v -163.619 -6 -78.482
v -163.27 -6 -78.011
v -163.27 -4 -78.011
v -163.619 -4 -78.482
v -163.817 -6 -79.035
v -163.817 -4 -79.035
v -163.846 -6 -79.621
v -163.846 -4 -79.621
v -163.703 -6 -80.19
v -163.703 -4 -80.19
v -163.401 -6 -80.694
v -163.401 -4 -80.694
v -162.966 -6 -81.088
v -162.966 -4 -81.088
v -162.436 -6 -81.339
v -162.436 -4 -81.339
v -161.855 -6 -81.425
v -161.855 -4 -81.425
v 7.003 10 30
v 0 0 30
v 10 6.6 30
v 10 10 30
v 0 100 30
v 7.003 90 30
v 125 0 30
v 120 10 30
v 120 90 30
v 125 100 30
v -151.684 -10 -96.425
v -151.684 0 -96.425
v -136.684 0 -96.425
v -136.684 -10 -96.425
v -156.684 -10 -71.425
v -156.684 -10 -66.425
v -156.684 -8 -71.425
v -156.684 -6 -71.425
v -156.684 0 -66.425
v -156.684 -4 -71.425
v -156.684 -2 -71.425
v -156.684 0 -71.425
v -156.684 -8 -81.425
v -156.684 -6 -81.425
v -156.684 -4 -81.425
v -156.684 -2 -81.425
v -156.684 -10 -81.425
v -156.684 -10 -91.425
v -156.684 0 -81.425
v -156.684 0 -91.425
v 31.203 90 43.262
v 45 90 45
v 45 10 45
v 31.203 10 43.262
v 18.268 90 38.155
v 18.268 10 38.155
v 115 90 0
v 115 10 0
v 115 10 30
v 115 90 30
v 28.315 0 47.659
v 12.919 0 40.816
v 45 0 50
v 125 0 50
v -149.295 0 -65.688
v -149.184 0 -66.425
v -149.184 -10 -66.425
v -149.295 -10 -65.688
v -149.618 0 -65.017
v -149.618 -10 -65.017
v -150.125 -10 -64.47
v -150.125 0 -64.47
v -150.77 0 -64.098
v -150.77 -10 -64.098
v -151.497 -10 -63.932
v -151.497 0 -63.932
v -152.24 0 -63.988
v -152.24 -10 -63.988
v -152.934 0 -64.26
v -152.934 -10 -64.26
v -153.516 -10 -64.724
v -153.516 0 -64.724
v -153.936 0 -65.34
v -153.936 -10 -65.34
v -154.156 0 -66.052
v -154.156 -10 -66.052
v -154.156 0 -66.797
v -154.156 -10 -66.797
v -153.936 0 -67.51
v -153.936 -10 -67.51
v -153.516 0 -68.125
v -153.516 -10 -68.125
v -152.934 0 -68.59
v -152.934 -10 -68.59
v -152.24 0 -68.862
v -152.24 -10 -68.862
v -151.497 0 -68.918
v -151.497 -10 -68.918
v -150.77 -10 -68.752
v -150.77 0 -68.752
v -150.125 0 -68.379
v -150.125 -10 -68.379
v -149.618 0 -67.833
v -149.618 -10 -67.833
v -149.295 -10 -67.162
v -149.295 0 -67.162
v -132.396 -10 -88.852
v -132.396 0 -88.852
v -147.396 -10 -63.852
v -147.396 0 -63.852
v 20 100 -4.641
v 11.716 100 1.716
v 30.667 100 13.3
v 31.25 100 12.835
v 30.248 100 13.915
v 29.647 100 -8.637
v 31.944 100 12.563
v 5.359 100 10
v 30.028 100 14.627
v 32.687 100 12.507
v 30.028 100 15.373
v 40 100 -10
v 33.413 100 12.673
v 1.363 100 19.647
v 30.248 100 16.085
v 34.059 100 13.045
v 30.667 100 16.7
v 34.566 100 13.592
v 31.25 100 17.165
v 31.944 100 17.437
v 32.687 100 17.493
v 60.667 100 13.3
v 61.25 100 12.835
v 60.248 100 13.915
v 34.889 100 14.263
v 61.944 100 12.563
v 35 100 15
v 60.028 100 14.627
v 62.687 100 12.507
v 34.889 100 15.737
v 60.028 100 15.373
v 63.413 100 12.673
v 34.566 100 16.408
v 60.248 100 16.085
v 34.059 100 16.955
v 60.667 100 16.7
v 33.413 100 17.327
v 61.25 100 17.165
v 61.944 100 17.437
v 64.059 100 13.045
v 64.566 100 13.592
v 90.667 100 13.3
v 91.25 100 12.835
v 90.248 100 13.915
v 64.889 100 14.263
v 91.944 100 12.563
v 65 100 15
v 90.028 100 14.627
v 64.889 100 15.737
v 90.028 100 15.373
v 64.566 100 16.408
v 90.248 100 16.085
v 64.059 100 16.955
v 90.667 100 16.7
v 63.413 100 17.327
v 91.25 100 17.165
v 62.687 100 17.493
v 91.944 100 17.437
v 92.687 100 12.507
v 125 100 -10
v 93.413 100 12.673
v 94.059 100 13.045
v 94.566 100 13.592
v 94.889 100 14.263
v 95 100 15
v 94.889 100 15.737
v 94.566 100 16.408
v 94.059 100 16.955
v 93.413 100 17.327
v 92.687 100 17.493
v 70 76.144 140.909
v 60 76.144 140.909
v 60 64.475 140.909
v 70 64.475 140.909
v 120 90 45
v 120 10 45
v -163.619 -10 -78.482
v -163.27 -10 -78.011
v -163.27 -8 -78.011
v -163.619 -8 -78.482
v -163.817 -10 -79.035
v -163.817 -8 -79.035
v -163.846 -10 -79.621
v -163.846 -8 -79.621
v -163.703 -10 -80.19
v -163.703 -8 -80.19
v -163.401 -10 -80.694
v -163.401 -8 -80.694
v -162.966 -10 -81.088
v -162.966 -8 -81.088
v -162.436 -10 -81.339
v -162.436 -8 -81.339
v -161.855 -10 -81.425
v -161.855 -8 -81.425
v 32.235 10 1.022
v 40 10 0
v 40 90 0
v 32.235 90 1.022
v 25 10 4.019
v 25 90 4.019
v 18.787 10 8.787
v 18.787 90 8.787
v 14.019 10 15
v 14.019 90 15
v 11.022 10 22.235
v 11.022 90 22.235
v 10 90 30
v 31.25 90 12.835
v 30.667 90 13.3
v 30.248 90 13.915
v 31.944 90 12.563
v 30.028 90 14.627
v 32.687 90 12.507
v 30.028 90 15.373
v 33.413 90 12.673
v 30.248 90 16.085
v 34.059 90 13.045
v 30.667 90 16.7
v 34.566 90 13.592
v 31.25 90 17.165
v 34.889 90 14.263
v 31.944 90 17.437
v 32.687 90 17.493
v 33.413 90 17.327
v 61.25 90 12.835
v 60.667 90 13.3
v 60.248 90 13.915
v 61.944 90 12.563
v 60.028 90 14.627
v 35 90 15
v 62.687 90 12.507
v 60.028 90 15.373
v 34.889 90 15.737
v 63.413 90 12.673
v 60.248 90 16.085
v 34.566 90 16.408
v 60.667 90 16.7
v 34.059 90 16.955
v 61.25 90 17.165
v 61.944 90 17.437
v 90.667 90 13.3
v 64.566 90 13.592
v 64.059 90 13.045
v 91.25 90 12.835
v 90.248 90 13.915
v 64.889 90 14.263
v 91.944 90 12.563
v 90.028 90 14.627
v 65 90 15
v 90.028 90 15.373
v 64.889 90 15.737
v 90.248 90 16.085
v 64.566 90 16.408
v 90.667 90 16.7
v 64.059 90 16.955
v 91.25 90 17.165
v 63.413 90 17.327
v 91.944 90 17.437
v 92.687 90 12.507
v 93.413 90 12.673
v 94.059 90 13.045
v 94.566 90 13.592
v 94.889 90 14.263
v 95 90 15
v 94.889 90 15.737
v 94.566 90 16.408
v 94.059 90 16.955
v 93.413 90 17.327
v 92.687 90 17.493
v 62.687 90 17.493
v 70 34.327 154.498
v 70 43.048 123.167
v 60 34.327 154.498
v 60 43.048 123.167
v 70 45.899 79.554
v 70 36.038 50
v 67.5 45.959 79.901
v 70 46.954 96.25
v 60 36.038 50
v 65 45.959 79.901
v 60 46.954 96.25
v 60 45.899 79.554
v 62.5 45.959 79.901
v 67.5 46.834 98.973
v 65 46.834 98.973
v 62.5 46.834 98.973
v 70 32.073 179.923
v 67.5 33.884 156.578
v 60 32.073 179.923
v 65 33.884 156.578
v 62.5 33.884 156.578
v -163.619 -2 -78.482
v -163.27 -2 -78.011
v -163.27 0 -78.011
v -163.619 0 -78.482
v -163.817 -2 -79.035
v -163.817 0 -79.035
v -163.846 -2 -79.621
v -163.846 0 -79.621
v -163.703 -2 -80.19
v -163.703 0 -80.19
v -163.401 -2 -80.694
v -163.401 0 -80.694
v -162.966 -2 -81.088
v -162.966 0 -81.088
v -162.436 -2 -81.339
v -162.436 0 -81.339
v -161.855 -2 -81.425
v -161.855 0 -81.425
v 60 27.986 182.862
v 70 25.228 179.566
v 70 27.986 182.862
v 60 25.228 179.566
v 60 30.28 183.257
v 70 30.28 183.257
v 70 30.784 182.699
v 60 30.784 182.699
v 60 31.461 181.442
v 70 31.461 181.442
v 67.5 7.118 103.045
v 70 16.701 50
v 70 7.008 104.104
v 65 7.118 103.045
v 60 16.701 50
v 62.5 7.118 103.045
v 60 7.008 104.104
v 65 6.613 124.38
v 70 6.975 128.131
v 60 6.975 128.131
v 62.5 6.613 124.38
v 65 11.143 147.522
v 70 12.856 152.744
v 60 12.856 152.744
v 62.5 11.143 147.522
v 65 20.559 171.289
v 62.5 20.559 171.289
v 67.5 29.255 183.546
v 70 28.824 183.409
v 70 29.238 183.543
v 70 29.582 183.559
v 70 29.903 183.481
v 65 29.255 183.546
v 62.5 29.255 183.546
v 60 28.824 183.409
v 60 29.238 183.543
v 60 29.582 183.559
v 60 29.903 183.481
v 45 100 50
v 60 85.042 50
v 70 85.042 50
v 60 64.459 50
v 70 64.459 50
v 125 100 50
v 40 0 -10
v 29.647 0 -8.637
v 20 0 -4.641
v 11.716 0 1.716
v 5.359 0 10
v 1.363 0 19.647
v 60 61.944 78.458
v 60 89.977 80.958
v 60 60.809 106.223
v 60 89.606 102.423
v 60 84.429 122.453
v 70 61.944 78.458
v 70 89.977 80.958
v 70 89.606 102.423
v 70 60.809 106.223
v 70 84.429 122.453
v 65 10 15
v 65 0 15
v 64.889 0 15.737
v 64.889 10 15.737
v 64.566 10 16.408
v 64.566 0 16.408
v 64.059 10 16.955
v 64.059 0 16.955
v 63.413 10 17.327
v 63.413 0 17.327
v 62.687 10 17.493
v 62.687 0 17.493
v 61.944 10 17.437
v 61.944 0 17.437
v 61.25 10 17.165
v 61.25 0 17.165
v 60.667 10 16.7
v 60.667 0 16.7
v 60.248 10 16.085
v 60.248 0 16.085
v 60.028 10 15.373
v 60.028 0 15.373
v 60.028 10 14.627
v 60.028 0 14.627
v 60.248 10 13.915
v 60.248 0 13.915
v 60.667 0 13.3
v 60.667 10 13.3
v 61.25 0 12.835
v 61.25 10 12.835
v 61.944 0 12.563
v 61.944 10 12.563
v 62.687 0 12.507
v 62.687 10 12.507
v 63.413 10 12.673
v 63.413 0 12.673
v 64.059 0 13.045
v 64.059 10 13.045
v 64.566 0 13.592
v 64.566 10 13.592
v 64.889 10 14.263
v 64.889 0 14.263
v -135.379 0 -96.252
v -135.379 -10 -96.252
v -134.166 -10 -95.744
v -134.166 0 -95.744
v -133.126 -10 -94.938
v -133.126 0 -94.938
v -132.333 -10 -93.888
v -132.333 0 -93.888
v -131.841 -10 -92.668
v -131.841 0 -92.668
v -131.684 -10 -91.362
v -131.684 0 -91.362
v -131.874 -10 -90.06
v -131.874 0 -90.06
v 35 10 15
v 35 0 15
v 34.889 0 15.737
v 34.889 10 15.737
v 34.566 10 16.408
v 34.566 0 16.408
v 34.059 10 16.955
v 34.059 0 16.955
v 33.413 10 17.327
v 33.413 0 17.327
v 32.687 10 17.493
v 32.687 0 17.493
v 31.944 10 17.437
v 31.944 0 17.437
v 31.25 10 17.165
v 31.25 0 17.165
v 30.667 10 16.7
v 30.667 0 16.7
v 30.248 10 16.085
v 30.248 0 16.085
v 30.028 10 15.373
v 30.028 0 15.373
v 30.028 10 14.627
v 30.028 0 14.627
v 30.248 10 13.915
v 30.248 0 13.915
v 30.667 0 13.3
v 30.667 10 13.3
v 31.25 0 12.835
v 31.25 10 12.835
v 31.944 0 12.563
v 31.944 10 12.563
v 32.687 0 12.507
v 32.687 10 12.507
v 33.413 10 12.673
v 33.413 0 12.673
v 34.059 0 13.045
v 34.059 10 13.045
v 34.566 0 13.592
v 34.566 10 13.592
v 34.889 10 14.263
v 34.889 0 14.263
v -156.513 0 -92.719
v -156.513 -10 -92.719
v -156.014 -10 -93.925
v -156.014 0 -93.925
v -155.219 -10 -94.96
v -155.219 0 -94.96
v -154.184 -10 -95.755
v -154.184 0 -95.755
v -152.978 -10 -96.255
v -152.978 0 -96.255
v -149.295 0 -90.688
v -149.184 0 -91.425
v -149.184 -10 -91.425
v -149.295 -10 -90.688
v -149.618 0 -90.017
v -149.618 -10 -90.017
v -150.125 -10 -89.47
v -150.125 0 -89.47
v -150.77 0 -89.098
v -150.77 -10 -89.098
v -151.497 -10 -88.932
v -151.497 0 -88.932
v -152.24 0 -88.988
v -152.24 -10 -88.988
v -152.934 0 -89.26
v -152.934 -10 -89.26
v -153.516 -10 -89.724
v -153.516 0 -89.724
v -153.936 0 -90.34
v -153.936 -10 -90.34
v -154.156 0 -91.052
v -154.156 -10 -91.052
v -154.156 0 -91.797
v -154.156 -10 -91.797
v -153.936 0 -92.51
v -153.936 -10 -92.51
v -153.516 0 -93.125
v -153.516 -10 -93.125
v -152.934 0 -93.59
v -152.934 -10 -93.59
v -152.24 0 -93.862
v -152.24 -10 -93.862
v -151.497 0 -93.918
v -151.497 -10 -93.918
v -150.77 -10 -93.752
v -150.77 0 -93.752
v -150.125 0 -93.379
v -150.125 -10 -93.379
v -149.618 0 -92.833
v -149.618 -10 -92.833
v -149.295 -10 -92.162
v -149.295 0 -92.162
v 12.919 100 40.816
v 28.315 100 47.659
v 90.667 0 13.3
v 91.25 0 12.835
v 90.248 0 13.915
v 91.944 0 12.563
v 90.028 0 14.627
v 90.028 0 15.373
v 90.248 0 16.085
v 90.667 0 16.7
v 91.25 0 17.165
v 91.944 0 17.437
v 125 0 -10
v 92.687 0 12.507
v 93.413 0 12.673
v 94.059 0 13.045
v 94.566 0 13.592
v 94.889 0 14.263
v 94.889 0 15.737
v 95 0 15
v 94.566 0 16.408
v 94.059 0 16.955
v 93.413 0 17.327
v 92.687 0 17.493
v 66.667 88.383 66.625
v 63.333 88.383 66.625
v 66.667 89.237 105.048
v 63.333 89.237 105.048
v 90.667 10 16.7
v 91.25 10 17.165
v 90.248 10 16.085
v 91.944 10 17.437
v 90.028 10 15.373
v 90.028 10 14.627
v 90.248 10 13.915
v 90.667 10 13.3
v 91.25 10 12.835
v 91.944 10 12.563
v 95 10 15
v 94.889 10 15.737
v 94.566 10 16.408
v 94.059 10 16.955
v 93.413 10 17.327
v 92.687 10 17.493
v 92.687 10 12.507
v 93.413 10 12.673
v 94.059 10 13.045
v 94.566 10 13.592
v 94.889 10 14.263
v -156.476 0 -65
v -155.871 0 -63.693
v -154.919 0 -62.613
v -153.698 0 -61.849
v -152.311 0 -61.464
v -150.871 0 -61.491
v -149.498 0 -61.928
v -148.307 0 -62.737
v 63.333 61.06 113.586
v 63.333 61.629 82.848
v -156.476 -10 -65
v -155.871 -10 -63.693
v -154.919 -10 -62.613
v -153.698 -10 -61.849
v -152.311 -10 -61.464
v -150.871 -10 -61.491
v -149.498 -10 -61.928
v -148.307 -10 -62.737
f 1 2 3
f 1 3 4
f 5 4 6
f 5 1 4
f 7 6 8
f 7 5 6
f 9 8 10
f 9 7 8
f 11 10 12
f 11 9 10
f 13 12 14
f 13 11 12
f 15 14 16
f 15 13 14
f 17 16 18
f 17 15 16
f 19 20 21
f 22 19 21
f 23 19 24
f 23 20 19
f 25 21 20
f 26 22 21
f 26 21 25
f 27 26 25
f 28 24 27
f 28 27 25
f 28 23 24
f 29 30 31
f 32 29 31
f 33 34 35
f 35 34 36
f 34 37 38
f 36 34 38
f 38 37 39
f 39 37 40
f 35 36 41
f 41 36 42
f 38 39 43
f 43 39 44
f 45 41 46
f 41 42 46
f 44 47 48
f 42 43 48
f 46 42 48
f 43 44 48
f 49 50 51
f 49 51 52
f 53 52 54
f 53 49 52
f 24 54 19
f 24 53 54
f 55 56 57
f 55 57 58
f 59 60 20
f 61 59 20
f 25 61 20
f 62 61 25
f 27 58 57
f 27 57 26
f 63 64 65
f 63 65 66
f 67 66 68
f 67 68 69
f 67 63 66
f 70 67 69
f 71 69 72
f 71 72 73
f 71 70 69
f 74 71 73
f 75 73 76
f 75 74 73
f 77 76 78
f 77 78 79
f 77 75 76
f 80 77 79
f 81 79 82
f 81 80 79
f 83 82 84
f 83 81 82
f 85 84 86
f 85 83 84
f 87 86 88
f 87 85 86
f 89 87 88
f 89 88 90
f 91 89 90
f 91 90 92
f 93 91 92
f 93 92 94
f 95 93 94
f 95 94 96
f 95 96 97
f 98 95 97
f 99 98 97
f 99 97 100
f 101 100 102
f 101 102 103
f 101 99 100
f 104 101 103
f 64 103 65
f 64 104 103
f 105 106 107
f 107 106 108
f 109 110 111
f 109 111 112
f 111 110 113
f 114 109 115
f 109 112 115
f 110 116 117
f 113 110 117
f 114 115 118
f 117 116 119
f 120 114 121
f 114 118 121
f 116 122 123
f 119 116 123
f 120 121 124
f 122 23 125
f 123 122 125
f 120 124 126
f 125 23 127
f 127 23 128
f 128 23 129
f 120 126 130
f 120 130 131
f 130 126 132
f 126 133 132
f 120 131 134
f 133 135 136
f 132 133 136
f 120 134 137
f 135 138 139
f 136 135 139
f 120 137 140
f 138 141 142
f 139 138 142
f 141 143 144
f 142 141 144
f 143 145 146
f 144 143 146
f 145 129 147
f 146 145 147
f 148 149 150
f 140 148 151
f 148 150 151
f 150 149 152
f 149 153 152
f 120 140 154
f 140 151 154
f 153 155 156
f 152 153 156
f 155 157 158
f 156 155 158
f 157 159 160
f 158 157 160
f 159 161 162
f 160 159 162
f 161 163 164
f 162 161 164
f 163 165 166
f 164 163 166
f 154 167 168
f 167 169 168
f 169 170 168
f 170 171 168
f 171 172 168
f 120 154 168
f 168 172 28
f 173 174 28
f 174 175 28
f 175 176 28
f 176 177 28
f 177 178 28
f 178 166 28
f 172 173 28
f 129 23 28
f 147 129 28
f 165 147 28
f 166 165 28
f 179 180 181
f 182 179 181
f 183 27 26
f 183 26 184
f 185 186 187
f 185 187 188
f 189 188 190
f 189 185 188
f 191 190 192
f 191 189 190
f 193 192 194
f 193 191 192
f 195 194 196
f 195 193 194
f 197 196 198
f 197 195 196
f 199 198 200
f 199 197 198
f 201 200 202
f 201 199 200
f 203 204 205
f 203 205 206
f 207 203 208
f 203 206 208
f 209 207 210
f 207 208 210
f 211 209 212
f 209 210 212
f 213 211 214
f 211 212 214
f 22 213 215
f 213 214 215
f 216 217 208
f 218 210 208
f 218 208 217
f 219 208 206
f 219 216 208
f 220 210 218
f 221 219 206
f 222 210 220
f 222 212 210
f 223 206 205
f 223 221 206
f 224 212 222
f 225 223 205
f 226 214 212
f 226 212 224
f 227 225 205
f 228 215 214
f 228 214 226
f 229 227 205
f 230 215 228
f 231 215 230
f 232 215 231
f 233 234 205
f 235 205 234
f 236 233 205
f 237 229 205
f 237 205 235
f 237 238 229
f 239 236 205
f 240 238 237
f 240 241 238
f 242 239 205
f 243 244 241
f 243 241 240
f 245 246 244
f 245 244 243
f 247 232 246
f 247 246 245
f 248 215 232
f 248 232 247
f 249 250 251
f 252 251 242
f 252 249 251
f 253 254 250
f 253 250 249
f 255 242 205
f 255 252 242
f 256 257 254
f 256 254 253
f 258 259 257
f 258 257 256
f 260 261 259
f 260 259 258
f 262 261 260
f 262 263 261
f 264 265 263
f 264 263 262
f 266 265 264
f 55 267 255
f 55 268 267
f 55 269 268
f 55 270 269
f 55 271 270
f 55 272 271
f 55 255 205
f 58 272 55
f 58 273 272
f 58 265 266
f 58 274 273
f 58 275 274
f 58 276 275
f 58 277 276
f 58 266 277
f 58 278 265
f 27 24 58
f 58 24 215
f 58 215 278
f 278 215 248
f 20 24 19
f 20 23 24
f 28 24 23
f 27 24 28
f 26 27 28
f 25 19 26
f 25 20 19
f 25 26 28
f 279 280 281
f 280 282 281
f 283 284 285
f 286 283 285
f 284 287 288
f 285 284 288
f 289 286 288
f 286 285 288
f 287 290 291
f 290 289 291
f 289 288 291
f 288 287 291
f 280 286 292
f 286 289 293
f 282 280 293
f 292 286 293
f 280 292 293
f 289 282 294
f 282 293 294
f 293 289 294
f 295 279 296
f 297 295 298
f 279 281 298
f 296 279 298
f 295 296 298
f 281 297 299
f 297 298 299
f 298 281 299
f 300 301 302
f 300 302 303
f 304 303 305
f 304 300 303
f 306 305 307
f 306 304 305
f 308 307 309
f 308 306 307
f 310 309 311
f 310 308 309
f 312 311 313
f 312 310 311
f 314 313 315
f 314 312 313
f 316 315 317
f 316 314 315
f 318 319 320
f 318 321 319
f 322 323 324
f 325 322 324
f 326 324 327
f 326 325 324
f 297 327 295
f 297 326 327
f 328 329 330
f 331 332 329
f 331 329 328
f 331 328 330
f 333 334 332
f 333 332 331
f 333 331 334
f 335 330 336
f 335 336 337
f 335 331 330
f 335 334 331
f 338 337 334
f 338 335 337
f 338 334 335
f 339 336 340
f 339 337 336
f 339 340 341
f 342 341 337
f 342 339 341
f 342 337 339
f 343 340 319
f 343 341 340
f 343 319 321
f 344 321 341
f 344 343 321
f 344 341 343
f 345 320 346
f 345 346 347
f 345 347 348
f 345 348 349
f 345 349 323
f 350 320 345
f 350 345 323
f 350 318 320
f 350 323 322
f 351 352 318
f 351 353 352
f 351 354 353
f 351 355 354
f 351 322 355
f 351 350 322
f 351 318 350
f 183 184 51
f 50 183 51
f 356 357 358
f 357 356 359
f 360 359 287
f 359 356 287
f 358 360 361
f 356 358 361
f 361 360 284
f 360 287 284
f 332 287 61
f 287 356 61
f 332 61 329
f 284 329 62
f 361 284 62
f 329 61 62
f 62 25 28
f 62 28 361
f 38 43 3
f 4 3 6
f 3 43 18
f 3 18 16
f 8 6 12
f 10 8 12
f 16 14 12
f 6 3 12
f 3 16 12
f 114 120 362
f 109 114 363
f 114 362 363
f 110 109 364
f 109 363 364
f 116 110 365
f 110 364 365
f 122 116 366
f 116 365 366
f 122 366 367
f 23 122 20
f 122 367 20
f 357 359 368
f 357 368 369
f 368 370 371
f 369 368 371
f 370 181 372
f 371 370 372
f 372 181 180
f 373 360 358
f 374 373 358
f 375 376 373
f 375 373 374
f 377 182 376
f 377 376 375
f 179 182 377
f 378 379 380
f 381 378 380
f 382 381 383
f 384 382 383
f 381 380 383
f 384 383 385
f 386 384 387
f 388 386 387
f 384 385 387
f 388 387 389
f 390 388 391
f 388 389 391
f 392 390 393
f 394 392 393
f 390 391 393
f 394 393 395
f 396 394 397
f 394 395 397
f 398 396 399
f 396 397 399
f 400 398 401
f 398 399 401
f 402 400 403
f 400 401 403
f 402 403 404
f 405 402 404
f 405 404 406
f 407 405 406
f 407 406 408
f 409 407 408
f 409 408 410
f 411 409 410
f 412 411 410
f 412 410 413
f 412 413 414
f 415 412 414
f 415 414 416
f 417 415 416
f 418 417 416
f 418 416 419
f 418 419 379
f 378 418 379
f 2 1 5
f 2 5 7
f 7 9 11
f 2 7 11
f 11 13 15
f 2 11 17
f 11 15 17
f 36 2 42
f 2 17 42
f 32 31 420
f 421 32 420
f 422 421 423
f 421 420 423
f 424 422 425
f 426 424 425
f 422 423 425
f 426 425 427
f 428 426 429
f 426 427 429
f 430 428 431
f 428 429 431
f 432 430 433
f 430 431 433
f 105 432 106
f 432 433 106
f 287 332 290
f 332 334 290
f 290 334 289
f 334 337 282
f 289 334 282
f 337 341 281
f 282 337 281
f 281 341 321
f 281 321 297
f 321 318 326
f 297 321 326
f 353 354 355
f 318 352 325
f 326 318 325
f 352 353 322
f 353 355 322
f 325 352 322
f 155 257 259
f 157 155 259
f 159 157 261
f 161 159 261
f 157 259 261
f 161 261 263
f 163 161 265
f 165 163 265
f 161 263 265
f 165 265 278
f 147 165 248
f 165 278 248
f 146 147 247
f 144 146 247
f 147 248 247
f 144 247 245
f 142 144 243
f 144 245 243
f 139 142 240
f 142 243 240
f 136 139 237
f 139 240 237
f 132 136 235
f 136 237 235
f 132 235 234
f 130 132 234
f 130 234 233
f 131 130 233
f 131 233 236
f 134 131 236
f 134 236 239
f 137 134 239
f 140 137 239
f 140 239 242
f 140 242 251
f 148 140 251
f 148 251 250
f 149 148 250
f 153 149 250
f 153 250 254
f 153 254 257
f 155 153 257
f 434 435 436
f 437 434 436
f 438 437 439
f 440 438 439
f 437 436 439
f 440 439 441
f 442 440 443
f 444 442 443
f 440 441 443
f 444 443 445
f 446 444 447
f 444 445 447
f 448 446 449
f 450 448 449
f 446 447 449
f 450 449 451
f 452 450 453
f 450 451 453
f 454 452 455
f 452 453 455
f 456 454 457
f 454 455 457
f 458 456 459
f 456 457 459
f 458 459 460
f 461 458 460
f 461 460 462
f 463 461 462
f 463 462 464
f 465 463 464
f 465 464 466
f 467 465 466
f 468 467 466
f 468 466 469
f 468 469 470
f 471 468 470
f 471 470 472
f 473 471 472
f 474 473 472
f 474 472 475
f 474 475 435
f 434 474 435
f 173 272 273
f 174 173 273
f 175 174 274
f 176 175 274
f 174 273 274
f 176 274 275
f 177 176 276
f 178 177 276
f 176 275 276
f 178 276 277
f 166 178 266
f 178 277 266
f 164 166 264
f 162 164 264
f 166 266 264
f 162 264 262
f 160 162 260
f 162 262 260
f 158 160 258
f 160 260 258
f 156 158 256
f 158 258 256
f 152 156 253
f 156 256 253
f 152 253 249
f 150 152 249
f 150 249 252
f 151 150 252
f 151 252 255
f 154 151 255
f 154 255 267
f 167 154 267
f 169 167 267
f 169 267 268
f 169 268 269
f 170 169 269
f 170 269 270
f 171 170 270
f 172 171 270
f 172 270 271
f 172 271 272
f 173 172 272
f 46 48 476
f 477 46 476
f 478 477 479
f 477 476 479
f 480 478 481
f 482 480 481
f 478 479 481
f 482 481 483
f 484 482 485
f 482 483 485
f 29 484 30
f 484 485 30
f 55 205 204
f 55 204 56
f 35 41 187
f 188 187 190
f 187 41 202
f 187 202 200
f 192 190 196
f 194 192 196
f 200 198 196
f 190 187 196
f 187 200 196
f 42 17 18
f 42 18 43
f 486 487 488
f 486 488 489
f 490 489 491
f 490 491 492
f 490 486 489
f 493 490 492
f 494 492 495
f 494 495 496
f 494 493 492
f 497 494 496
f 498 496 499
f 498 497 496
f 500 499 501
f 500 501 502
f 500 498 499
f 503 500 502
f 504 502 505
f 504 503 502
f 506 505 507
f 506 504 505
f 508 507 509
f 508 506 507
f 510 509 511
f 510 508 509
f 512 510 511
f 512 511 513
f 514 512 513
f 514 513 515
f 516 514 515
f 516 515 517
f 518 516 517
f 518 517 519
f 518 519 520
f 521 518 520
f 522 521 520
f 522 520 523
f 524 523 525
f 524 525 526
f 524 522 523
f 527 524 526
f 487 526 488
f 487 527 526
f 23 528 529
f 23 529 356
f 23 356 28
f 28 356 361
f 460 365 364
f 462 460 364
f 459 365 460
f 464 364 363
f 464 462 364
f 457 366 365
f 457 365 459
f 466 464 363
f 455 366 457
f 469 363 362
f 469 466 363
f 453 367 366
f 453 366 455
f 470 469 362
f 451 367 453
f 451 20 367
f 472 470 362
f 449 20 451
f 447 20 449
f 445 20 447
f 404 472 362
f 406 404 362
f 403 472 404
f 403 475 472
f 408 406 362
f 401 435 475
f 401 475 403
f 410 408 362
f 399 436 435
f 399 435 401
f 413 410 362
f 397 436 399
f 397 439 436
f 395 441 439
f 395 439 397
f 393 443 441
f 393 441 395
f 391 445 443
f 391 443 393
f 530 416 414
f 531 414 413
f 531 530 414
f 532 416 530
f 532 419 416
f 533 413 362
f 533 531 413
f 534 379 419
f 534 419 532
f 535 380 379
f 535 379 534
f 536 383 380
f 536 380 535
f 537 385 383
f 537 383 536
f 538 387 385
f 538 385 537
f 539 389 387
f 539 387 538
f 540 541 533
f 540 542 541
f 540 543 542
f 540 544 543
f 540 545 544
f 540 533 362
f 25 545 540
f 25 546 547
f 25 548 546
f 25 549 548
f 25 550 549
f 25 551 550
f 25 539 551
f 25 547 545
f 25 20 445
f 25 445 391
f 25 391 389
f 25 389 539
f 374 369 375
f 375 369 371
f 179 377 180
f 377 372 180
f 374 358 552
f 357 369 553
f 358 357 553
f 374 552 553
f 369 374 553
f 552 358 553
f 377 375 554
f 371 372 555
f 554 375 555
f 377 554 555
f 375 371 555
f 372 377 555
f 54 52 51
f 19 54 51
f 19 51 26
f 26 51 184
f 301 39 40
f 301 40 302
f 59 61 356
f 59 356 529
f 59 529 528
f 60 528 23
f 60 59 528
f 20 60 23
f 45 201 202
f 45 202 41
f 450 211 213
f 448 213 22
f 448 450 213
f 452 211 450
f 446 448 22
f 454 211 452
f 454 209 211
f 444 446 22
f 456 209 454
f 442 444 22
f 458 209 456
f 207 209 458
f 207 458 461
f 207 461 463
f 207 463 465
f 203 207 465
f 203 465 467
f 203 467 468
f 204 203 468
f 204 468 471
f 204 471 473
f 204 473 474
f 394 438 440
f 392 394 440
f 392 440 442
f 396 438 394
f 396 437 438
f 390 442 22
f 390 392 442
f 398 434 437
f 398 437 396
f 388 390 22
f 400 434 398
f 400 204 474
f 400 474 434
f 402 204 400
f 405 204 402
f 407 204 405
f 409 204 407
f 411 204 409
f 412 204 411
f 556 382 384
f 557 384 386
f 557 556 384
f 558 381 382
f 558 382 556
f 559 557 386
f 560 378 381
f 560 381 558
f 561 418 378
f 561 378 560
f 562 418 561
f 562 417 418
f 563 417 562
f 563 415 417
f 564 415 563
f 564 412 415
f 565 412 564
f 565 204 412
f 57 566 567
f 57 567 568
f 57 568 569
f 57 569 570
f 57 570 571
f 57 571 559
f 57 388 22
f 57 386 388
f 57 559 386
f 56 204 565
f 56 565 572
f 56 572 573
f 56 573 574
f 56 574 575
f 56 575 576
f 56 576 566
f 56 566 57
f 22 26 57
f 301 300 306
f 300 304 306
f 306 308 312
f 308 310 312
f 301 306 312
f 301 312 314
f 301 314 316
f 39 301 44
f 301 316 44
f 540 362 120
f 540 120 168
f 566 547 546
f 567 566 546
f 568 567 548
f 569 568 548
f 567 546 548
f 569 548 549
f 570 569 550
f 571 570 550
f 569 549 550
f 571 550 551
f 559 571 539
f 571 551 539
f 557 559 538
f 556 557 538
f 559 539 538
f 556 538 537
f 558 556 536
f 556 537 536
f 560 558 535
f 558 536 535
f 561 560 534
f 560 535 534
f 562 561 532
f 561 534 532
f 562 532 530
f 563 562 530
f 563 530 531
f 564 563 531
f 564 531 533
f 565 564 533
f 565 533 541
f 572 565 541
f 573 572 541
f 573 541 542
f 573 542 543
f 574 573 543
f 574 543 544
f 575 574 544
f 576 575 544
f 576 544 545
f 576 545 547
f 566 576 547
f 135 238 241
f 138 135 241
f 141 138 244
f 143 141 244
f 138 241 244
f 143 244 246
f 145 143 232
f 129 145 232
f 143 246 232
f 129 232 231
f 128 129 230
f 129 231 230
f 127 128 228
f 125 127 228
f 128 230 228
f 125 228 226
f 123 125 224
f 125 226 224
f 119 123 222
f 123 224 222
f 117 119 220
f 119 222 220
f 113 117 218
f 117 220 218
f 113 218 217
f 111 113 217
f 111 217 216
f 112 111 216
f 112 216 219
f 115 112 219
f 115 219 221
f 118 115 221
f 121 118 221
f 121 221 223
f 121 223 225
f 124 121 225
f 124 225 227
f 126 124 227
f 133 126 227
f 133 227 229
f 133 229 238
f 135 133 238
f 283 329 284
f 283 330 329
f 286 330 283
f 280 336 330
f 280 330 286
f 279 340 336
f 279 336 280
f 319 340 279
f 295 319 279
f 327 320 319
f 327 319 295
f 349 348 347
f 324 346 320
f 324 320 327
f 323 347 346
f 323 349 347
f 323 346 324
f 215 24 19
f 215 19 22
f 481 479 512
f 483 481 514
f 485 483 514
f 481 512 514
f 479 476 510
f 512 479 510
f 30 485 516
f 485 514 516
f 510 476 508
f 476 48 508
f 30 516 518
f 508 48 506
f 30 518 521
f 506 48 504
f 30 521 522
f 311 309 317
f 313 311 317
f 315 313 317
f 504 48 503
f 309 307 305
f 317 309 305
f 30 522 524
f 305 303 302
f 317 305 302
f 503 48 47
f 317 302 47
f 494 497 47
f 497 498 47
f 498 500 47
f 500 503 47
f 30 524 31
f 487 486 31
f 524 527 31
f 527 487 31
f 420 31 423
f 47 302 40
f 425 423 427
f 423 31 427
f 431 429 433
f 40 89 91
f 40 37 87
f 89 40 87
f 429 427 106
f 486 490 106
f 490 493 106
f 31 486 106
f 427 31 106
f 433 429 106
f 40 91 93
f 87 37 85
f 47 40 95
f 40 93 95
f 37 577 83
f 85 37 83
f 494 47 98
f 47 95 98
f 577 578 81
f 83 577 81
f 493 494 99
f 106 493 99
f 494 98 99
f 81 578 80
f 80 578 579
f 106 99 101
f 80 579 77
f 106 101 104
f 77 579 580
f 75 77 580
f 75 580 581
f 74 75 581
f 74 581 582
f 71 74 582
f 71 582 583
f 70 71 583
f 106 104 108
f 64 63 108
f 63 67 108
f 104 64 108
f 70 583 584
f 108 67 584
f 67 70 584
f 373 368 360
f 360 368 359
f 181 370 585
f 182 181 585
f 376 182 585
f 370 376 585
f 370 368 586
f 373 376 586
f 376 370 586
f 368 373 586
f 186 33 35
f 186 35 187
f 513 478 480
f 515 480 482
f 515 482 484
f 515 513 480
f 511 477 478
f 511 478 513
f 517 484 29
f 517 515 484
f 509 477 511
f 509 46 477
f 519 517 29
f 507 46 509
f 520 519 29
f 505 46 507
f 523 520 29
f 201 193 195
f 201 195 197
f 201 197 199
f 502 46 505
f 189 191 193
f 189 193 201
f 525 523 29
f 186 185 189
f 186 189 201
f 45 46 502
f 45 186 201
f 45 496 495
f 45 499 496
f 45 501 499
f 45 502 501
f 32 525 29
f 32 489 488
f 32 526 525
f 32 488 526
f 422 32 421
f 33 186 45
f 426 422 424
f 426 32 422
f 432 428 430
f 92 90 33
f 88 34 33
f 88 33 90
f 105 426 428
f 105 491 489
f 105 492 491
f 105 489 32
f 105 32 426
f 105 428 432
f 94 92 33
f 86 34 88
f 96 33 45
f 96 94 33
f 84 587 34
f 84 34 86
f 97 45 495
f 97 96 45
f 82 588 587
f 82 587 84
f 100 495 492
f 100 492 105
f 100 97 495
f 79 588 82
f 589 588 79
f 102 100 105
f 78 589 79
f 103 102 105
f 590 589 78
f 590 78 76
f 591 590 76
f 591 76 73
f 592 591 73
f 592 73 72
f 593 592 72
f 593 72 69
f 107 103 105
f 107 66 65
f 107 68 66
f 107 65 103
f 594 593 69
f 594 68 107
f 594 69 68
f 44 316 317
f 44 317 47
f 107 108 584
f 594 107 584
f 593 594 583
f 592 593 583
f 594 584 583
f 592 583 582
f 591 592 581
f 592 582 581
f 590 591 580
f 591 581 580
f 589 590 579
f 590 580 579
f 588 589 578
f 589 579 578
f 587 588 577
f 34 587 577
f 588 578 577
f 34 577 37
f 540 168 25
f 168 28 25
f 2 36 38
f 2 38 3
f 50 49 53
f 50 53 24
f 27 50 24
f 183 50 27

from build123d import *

# Parameters (mm, degrees)
F0_W           = 125
F0_H           = 100
F0_W_2         = 105
F0_H_2         = 80
F1_DEPTH       = 30
F2_R           = 2.5
F3_DEPTH       = 100.001
F4_W           = 125
F4_H           = 100
F4_W_2         = 105
F4_H_2         = 80
F5_DEPTH       = 10
F7_DEPTH       = 6666
F9_DEPTH       = 83.4
F10_W          = 80
F10_H          = 20
F11_DEPTH      = 100
F15_DEPTH      = 10
F17_DEPTH      = 40
F17_DEPTH_BACK = 40
F18_R          = 2.5
F19_DEPTH      = 10
F21_DEPTH      = 10
F22_W          = 11.9066902784
F22_H          = 2
F22_W_2        = 5.1715728753
F22_W_3        = 11.2758645205
F23_DEPTH      = 25


with BuildPart() as f1:
    # F0 (on Top) → F1 (new body)
    with BuildSketch(Plane.XY):
        with Locations((62.5, 50)):
            Rectangle(F0_W, F0_H)
        with Locations((62.5, 50)):
            Rectangle(F0_W_2, F0_H_2, mode=Mode.SUBTRACT)
    extrude(amount=F1_DEPTH)

    # F2 (on face) → F3 (cut, through all)
    with BuildSketch(Plane.XZ):
        with Locations((32.5, 15)):
            Circle(F2_R)
        with Locations((62.5, 15)):
            Circle(F2_R)
        with Locations((92.5, 15)):
            Circle(F2_R)
    extrude(amount=-F3_DEPTH, mode=Mode.SUBTRACT)

    # F4 (on face) → F5 (join)
    with BuildSketch(Plane(origin=(0, 0, 0), x_dir=(1, 0, 0), z_dir=(0, 0, -1))):
        with Locations((62.5, -50)):
            Rectangle(F4_W, F4_H)
        with Locations((62.5, -50)):
            Rectangle(F4_W_2, F4_H_2, mode=Mode.SUBTRACT)
        with Locations((62.5, -50)):
            Rectangle(F4_W_2, F4_H_2)
    extrude(amount=F5_DEPTH)

    # F6 (on face) → F7 (cut)
    with BuildSketch(Plane.XZ):
        Polygon((0, -10), (0, 30), (-36.8616729975, 33.3101339638), (-29.7704413533, -57.1963898838), (40, -10), align=None)
        with BuildLine():
            ThreePointArc((40, -10), (11.7157287525, 1.7157287525), (0, 30))
            Line((0, 30), (0, -10))
            Line((0, -10), (40, -10))
        make_face()
    extrude(amount=-F7_DEPTH, mode=Mode.SUBTRACT)

    # F8 (on face) → F9 (join)
    with BuildSketch(Plane.XZ.offset(-90)):
        with BuildLine():
            Line((10, 30), (10, 3.5424868894))
            ThreePointArc((10, 3.5424868894), (11.7157287525, 1.7157287525), (13.5424868894, 0))
            Line((13.5424868894, 0), (40, 0))
            ThreePointArc((40, 0), (18.7867965644, 8.7867965644), (10, 30))
        make_face()
    extrude(amount=F9_DEPTH)


with BuildPart() as f11:
    # F10 (on face) → F11 (new body)
    with BuildSketch(Plane.XZ):
        with BuildLine():
            Line((0, 30), (45, 30))
            Line((45, 30), (45, 50))
            ThreePointArc((45, 50), (20.3778554955, 44.7748251351), (0, 30))
        make_face()
        with Locations((85, 40)):
            Rectangle(F10_W, F10_H)
    extrude(amount=-F11_DEPTH)

    # F14 (on offset) → F15 (join)
    with BuildSketch(Plane.YZ.offset(60)):
        with BuildLine():
            Line((64.4753500819, 49.8327091336), (85.0027536981, 49.8327091336))
            add(Edge.make_bspline(
                [(85.0027536981, 49.8327091336), (86.1665383789, 54.7384858339), (89.0602060082, 67.0907089545), (92.6809583428, 106.7258604967), (81.6452944269, 129.5412851185), (76.1444941163, 140.9089565277)],
                knots=[0, 0, 0, 0, 0.2505763425, 0.6259139796, 1, 1, 1, 1], degree=3))
            Line((76.1444941163, 140.9089565277), (64.4753500819, 140.9089565277))
            add(Edge.make_bspline(
                [(64.4753500819, 140.9089565277), (63.0385344229, 131.9328773477), (60.0835105921, 113.4722434338), (61.3578321961, 82.6051306794), (63.4232718078, 60.892518239), (64.4753500819, 49.8327091336)],
                knots=[0, 0, 0, 0, 0.3170912381, 0.6521450118, 1, 1, 1, 1], degree=3))
        make_face()
        with BuildLine():
            Line((16.7012212295, 50), (36.0381749595, 50))
            add(Edge.make_bspline(
                [(36.0381749595, 50), (39.9439264096, 60.5788452322), (48.8842587835, 79.1577540087), (45.9418389645, 119.6915304439), (32.2516183868, 155.6878532796), (32.1214988224, 172.4366188097), (32.0729725063, 179.9233108759)],
                knots=[0, 0, 0, 0, 0.2446036002, 0.518483464, 0.7891223984, 1, 1, 1, 1], degree=3))
            add(Edge.make_bspline(
                [(16.7012212295, 50), (12.8164200839, 69.7679192689), (5.1557437253, 103.0165449914), (6.3359006778, 143.1855642768), (28.4164917181, 189.4002776519), (31.3234141752, 181.8729274365), (32.0729725063, 179.9233108759)],
                knots=[0, 0, 0, 0, 0.3260645241, 0.6228520483, 0.9048596934, 1, 1, 1, 1], degree=3))
        make_face()
    extrude(amount=F15_DEPTH)


with BuildPart() as f17_tool:
    # F16 (on offset) → F17 (new body, two sides)
    with BuildSketch(Plane.XZ.offset(-50)) as f17_sk:
        with BuildLine():
            Line((120, 45), (45, 45))
            ThreePointArc((45, 45), (24.5746472766, 41.1142074845), (7.003, 29.9997291191))
            Line((7.003, 29.9997291191), (120, 29.9997291191))
            Line((120, 29.9997291191), (120, 45))
        make_face()
    extrude(amount=-F17_DEPTH)
    extrude(f17_sk.sketch, amount=F17_DEPTH_BACK)


with BuildPart() as f1_1:
    add(f1.part)

    # F17: cut by f17_tool
    add(f17_tool.part, mode=Mode.SUBTRACT)


with BuildPart() as f11_1:
    add(f11.part)

    # F17: cut by f17_tool
    add(f17_tool.part, mode=Mode.SUBTRACT)


with BuildPart() as f19:
    # F18 (on Front) → F19 (new body)
    with BuildSketch(Plane.XZ):
        with BuildLine():
            ThreePointArc((-147.3962509632, -63.8523980975), (-153.0183835013, -61.6063022336), (-156.6837155918, -66.4248768747))
            Line((-156.6837155918, -66.4248768747), (-156.6837155918, -91.4248768747))
            ThreePointArc((-156.6837155918, -91.4248768747), (-155.2192494977, -94.9604107806), (-151.6837155918, -96.4248768747))
            Line((-151.6837155918, -96.4248768747), (-136.6837155918, -96.4248768747))
            ThreePointArc((-136.6837155918, -96.4248768747), (-132.332716058, -93.8883709496), (-132.3962509632, -88.8523980975))
            Line((-132.3962509632, -88.8523980975), (-147.3962509632, -63.8523980975))
        make_face()
        with Locations((-151.6837155918, -91.4248768747)):
            Circle(F18_R, mode=Mode.SUBTRACT)
        with Locations((-151.6837155918, -66.4248768747)):
            Circle(F18_R, mode=Mode.SUBTRACT)
    extrude(amount=F19_DEPTH)

    # F20 (on face) → F21 (join)
    with BuildSketch(Plane.XZ.offset(10)):
        with BuildLine():
            Line((-156.6837155918, -81.4248768747), (-156.6837155918, -71.4248768747))
            Line((-156.6837155918, -71.4248768747), (-163.2695020294, -78.0106633123))
            ThreePointArc((-163.2695020294, -78.0106633123), (-163.7030475321, -80.1902437394), (-161.855288467, -81.4248768747))
            Line((-161.855288467, -81.4248768747), (-156.6837155918, -81.4248768747))
        make_face()
    extrude(amount=-F21_DEPTH)

    # F22 (on face) → F23 (cut)
    with BuildSketch(Plane(origin=(0, 0, -81.4248768747), x_dir=(1, 0, 0), z_dir=(0, 0, -1))):
        with Locations((-167.8086336062, 7)):
            Rectangle(F22_W, F22_H)
        with Locations((-159.2695020294, 3)):
            Rectangle(F22_W_2, F22_H)
        with Locations((-159.2695020294, 7)):
            Rectangle(F22_W_2, F22_H)
        with Locations((-167.4932207273, 3)):
            Rectangle(F22_W_3, F22_H)
    extrude(amount=-F23_DEPTH, mode=Mode.SUBTRACT)


solid = Compound([f1_1.part, f11_1.part, f19.part])
